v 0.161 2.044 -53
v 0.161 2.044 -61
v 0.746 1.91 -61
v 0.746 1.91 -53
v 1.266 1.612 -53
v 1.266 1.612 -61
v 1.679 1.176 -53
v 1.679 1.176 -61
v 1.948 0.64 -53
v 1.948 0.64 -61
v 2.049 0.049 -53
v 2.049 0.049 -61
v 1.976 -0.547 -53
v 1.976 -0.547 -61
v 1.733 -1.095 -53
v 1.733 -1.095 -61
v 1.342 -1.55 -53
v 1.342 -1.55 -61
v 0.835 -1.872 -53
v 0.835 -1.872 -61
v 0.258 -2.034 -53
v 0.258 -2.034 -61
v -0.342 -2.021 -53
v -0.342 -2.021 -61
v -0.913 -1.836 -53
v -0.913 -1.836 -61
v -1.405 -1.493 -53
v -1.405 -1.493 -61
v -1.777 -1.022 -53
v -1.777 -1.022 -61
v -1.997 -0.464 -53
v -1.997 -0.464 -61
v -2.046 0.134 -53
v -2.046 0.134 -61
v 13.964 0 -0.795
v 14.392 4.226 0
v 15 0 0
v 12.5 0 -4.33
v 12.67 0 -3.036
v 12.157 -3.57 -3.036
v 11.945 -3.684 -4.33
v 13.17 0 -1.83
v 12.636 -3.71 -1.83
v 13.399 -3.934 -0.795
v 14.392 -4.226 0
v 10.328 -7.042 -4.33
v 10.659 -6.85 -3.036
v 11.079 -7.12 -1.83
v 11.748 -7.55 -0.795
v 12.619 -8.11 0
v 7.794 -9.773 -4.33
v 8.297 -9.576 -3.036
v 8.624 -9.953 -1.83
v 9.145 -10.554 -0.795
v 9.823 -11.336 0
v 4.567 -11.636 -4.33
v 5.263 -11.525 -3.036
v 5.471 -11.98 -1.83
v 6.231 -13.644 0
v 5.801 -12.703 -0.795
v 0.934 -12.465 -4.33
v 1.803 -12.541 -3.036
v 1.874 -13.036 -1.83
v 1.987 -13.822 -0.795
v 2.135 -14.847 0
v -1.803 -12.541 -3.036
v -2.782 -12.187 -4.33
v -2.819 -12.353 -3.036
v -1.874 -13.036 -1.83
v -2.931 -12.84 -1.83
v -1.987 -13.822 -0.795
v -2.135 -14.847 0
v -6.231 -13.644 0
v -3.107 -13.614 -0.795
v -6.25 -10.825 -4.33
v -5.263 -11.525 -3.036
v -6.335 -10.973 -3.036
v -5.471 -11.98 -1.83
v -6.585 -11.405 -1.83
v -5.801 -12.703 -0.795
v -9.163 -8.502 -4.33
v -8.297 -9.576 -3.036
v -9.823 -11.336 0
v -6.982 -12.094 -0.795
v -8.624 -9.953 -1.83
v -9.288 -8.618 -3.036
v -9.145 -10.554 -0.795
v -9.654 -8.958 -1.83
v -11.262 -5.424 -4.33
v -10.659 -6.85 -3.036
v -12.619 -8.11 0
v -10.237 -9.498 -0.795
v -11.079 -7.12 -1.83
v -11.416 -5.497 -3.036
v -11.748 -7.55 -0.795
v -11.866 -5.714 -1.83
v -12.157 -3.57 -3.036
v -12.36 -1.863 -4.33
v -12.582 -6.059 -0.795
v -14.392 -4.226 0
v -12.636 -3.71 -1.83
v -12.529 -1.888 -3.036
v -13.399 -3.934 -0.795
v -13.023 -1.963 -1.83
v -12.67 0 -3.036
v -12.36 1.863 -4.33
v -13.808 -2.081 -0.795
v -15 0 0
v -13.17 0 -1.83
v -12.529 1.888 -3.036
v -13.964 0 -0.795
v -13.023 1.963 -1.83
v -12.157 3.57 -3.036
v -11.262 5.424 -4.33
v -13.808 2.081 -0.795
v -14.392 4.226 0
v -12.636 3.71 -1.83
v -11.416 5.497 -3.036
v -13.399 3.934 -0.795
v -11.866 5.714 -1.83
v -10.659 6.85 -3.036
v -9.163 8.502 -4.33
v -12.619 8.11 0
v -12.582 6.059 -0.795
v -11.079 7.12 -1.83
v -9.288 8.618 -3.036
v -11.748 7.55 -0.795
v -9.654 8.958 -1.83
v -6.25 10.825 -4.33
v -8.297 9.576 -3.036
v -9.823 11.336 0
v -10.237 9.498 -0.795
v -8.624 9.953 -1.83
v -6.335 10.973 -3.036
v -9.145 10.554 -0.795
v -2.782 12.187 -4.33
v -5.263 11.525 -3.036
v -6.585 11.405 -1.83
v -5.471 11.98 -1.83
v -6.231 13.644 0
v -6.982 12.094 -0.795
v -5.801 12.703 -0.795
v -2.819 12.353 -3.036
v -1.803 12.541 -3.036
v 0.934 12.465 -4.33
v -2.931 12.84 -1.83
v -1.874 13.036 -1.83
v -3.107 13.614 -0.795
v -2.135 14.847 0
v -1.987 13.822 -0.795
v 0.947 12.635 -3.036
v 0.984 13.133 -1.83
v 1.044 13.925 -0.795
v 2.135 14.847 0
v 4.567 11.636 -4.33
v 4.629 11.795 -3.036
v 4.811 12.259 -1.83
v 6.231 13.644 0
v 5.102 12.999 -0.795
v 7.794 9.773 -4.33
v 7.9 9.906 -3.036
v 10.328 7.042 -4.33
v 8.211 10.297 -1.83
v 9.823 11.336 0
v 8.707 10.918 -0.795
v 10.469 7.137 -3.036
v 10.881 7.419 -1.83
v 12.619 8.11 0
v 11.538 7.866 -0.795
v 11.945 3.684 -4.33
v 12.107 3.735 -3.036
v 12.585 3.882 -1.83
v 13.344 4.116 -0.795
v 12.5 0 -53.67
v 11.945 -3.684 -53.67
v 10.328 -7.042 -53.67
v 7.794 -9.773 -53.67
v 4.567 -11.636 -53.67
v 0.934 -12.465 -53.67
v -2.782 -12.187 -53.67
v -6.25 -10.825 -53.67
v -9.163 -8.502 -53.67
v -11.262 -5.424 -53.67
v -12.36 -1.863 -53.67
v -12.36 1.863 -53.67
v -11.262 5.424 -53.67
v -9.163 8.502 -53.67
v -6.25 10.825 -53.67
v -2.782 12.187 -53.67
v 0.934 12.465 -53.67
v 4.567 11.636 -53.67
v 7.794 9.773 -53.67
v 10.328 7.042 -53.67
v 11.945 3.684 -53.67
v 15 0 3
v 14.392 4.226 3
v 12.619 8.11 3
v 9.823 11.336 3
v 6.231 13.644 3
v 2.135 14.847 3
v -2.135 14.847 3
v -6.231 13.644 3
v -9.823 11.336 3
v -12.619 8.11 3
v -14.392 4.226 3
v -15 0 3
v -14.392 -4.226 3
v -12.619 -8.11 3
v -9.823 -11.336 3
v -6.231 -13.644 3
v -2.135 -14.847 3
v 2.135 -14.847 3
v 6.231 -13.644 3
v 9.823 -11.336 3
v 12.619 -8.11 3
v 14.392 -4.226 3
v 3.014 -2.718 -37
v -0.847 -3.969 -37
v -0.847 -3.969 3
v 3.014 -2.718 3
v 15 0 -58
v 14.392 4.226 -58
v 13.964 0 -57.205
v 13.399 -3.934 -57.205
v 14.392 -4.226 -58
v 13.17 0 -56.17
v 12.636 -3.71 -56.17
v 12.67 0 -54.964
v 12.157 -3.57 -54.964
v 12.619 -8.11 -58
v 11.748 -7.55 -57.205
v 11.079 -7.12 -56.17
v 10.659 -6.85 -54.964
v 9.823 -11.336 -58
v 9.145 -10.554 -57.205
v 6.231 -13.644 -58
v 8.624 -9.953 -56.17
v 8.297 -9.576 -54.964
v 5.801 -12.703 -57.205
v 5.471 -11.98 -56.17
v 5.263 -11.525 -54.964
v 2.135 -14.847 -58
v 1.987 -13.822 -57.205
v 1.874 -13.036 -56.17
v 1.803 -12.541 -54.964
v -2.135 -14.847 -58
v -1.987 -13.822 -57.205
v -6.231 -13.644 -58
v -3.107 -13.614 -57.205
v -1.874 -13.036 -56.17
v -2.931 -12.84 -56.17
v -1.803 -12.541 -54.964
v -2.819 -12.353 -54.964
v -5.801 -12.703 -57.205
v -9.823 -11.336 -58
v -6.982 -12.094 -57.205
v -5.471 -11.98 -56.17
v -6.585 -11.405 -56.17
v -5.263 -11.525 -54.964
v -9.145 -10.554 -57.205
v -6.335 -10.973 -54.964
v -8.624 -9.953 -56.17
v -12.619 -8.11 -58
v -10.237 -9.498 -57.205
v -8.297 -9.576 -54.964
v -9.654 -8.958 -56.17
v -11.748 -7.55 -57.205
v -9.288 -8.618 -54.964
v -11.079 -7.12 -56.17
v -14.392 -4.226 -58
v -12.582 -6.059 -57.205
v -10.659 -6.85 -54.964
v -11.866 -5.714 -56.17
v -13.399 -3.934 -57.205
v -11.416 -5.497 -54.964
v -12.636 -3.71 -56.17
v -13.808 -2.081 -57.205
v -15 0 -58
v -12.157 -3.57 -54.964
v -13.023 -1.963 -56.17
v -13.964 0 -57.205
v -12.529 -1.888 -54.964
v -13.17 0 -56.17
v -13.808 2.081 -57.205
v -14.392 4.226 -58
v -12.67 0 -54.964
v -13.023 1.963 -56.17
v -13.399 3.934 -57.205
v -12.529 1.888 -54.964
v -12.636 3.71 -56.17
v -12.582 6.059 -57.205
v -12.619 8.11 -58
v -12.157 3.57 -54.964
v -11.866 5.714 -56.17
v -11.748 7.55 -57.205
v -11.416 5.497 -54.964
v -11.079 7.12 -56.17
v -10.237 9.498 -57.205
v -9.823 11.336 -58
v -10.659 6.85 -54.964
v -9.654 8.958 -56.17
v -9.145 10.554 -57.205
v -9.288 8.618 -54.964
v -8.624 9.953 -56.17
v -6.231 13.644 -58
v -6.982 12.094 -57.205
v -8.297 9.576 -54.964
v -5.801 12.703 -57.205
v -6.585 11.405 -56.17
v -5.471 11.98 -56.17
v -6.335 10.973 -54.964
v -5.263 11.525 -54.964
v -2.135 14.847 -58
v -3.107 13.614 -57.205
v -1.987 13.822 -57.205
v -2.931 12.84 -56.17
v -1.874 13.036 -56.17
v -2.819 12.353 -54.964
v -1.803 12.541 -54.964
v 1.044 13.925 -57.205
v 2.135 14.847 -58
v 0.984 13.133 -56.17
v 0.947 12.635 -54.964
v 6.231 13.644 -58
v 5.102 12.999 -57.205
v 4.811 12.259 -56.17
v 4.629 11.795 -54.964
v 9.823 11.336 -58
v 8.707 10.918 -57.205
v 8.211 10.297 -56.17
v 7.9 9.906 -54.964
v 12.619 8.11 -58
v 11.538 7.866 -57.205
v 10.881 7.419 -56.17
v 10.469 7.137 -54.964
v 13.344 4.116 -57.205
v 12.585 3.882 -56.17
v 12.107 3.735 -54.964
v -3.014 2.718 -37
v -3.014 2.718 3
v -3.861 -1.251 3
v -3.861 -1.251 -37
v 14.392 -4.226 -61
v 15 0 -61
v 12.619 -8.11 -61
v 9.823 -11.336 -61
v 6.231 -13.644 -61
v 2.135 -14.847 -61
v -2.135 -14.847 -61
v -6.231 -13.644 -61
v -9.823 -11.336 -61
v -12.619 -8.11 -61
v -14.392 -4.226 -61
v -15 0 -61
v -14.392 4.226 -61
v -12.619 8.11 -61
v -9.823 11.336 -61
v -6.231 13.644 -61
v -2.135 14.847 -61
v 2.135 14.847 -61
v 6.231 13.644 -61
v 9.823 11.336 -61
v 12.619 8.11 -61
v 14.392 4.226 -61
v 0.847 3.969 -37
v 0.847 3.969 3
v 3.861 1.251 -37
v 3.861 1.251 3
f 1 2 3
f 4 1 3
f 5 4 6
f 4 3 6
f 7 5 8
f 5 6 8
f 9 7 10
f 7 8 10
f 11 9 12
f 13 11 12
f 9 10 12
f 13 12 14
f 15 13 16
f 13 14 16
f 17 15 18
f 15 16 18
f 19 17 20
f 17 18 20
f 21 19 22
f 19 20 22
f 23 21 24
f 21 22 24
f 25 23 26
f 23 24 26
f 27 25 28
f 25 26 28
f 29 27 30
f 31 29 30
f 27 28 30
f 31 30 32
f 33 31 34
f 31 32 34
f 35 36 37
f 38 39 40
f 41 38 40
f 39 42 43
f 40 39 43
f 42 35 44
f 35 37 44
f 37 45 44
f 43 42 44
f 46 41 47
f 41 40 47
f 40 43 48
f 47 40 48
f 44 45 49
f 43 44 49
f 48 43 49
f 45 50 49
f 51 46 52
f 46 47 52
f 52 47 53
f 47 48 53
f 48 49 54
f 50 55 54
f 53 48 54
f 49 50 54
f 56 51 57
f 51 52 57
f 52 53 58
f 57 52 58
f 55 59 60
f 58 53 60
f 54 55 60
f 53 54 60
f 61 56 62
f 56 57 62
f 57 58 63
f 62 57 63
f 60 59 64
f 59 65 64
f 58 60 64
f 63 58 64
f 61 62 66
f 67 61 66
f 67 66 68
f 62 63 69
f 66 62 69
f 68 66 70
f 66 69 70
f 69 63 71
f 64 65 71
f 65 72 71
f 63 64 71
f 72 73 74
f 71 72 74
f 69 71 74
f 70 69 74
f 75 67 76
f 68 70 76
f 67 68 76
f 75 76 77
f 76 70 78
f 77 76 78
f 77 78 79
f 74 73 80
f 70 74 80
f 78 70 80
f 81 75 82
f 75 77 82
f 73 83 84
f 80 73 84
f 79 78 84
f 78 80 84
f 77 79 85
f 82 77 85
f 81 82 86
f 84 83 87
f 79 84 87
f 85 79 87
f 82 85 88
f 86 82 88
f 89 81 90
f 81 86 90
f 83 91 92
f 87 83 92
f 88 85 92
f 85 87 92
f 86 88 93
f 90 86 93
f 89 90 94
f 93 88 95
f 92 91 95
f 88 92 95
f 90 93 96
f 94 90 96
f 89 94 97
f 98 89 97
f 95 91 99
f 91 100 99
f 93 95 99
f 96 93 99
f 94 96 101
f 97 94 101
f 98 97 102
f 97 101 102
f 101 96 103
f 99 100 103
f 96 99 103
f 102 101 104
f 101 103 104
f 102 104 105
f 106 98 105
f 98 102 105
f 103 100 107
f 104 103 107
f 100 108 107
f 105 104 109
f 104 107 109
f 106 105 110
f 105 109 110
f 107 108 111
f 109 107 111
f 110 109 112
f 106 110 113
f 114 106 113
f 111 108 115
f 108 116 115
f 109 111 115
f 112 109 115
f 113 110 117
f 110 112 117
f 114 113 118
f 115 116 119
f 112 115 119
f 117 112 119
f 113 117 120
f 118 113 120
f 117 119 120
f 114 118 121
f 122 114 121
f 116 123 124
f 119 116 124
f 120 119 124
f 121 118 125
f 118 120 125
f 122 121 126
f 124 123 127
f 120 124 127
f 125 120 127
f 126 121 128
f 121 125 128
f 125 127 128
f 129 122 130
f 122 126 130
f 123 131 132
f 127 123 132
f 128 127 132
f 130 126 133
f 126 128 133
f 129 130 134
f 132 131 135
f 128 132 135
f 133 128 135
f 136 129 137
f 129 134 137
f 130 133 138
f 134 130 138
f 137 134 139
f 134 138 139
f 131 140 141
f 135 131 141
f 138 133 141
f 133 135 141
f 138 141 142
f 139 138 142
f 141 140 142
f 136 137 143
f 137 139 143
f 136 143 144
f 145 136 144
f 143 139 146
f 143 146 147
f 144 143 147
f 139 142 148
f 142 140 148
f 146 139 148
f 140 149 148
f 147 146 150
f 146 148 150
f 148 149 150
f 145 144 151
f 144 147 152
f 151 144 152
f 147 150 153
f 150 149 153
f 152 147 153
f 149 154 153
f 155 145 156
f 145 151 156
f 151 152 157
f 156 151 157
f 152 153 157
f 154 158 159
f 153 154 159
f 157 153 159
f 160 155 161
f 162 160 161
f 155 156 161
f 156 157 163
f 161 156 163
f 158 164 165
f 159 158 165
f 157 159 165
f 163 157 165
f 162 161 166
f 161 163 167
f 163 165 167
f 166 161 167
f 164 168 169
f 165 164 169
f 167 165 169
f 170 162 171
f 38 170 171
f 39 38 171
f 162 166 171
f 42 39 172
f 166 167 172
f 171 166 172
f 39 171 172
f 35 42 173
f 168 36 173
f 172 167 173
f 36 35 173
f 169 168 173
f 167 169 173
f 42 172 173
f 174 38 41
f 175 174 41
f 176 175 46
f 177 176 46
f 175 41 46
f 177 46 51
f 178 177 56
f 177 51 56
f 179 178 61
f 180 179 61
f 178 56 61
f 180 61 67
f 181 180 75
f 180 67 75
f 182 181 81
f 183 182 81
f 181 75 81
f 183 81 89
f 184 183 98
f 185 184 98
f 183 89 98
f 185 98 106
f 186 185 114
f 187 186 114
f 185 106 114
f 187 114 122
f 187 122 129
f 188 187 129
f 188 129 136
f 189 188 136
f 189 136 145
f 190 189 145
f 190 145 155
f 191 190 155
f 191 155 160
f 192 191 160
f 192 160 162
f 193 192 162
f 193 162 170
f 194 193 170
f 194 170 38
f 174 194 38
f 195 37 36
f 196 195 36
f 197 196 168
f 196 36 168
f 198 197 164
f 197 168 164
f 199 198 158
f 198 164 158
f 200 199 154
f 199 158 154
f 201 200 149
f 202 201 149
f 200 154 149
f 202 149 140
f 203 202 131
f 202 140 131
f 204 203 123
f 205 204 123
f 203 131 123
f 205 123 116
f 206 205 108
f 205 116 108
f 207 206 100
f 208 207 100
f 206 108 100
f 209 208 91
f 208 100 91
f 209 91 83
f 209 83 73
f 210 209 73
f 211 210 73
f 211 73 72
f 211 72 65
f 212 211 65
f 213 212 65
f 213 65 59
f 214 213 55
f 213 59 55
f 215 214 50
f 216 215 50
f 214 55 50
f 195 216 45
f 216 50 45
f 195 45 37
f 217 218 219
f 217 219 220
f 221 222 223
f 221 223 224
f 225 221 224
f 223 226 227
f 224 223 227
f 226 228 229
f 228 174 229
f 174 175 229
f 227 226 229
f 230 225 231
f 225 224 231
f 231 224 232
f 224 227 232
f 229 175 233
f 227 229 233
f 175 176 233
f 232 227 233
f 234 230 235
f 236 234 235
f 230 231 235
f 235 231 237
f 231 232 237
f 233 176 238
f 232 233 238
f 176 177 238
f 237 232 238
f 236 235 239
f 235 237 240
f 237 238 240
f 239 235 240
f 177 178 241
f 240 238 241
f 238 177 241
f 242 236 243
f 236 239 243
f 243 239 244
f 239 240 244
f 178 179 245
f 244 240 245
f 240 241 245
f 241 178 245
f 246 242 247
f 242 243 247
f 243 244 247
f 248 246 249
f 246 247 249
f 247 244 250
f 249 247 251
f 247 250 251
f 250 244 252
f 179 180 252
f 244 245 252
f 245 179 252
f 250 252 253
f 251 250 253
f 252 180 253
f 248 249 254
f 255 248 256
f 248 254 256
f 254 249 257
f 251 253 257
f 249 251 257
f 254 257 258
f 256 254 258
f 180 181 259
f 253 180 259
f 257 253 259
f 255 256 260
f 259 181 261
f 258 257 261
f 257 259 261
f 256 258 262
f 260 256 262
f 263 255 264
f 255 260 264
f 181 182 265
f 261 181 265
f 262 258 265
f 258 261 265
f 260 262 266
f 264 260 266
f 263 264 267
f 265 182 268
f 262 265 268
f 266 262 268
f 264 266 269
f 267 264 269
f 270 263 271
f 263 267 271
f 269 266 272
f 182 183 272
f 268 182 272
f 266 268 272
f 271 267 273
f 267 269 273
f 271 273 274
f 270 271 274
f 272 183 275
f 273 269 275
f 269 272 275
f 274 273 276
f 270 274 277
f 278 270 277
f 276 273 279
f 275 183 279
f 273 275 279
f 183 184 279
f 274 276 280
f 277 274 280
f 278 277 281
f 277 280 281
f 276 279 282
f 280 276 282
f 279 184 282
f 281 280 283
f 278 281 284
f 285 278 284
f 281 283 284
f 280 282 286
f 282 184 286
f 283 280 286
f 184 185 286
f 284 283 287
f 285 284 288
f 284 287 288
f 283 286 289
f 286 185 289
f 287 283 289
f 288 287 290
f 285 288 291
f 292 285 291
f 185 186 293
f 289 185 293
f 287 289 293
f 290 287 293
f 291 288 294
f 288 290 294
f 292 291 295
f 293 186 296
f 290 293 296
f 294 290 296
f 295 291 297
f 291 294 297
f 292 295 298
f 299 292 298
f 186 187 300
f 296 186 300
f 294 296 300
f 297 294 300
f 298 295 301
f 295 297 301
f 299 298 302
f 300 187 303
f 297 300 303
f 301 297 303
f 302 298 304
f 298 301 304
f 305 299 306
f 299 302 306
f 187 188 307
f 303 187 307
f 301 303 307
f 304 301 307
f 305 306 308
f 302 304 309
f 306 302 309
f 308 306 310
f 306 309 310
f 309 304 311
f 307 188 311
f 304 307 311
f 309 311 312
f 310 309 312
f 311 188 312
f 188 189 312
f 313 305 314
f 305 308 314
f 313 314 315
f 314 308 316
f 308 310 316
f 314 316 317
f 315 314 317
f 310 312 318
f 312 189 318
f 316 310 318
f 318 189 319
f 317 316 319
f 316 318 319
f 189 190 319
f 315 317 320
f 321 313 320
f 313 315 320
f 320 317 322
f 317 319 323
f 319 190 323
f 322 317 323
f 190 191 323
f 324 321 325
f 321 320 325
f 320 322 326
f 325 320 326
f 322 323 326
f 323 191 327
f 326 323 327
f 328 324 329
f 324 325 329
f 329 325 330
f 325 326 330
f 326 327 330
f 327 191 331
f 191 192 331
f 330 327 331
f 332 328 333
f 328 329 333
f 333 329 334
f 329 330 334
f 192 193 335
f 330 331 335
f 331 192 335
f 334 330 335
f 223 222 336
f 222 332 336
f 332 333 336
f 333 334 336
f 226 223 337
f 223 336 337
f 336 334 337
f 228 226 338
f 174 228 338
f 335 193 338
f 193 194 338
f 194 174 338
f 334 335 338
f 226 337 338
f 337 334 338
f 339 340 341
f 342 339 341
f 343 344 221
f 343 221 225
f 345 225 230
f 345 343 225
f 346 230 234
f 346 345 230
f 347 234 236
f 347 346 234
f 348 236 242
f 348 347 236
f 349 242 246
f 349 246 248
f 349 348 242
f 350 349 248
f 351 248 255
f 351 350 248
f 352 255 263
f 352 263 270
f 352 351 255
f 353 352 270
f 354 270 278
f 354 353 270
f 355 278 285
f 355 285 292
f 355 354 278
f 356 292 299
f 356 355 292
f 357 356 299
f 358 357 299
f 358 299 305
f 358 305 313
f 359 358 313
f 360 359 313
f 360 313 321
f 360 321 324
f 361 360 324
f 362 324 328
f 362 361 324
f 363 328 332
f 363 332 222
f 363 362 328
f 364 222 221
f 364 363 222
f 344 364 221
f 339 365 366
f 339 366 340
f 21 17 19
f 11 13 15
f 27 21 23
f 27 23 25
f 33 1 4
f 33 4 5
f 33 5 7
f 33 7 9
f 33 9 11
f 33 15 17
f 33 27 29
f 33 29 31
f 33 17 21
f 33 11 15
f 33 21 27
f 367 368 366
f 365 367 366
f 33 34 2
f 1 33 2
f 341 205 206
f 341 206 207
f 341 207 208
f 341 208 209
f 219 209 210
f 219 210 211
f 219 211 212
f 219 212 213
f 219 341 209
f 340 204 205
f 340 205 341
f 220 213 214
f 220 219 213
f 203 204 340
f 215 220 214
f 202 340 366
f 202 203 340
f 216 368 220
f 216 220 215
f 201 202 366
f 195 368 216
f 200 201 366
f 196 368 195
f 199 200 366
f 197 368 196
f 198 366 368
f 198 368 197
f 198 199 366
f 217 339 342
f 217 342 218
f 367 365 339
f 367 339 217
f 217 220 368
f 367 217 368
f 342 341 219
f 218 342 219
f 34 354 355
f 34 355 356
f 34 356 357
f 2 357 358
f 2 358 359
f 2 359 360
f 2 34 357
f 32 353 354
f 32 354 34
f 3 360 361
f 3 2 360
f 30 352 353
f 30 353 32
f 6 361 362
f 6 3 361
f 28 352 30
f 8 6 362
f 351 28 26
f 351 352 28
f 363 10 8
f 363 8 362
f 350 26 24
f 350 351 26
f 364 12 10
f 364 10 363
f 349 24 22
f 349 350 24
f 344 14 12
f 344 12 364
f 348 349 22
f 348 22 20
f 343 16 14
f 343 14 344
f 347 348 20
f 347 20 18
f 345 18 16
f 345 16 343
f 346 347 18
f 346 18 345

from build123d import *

# Parameters (mm, degrees)
CROQUIS1_R              = 15
SALIENTE_EXTRUIR1_DEPTH = 3
CROQUIS3_R              = 9
SALIENTE_EXTRUIR3_DEPTH = 58
SALIENTE_EXTRUIR4_START = 3
CROQUIS4_R              = 15
SALIENTE_EXTRUIR4_DEPTH = 3
CORTAR_EXTRUIR1_DEPTH   = 8
CROQUIS8_R              = 12.5
CROQUIS8_R_2            = 9
SALIENTE_EXTRUIR7_DEPTH = 58
REDONDEO3_R             = 5
CORTAR_EXTRUIR2_DEPTH   = 40


with BuildPart() as part:
    # Croquis1 → Saliente-Extruir1 (new body)
    with BuildSketch(Plane.XY):
        Circle(CROQUIS1_R)
    extrude(amount=SALIENTE_EXTRUIR1_DEPTH)

    # Croquis3 → Saliente-Extruir3 (add)
    with BuildSketch(Plane(origin=(0, 0, 0), x_dir=(-1, 0, 0), z_dir=(0, 0, -1))):
        with Locations(Location((0, 0, 0), (0, 0, 180))):
            Circle(CROQUIS3_R)
    extrude(amount=SALIENTE_EXTRUIR3_DEPTH)

    # Croquis4 → Saliente-Extruir4 (add)
    with BuildSketch(Plane(origin=(0, 0, -58), x_dir=(-1, 0, 0), z_dir=(0, 0, -1)).offset(SALIENTE_EXTRUIR4_START)):
        with Locations(Location((0, 0, 0), (0, 0, 180))):
            Circle(CROQUIS4_R)
    extrude(amount=-SALIENTE_EXTRUIR4_DEPTH)

    # Croquis5 → Cortar-Extruir1 (cut)
    with BuildSketch(Plane(origin=(0, 0, -61), x_dir=(-1, 0, 0), z_dir=(0, 0, -1))):
        with BuildLine():
            Line((2.045621727, 0.133909486), (-0.160815889, 2.043682522))
            ThreePointArc((-0.160815889, 2.043682522), (-1.341615267, -1.550022089), (2.045621727, 0.133909486))
        make_face()
    extrude(amount=-CORTAR_EXTRUIR1_DEPTH, mode=Mode.SUBTRACT)

    # Croquis8 → Saliente-Extruir7 (add)
    with BuildSketch(Plane(origin=(0, 0, 0), x_dir=(-1, 0, 0), z_dir=(0, 0, -1))):
        with Locations(Location((0, 0, 0), (0, 0, 180))):
            Circle(CROQUIS8_R)
        Circle(CROQUIS8_R_2, mode=Mode.SUBTRACT)
    extrude(amount=SALIENTE_EXTRUIR7_DEPTH)

    # Redondeo3
    # the kernel refuses this fillet: 5 mm, written as the material it adds along each edge
    with BuildSketch(Plane(origin=(0, 0, -58), x_dir=(1, 0, 0), z_dir=(0, 1, 0))) as redondeo3_piece_1:
        with BuildLine():
            CenterArc((17.5, -4.330127019), REDONDEO3_R, 120, 60)
            Line((12.5, -4.330127019), (12.4, -4.330127019))
            Line((12.4, -4.330127019), (12.4, 0))
            Line((12.4, 0), (12.5, 0.1))
            ThreePointArc((12.5, 0.1), (13.75, 0.1), (14.95, 0.08660254))
            Line((14.95, 0.08660254), (15, 0))
        make_face()
    revolve(axis=Axis((0, 0, -58), (0, 0, -1)))
    with BuildSketch(Plane(origin=(0, 0, 0), x_dir=(1, 0, 0), z_dir=(0, 1, 0))) as redondeo3_piece_2:
        with BuildLine():
            CenterArc((17.5, 4.330127019), REDONDEO3_R, 180, 60)
            Line((15, 0), (14.95, -0.08660254))
            ThreePointArc((14.95, -0.08660254), (13.75, -0.1), (12.5, -0.1))
            Line((12.5, -0.1), (12.4, 0))
            Line((12.4, 0), (12.4, 4.330127019))
            Line((12.4, 4.330127019), (12.5, 4.330127019))
        make_face()
    revolve(axis=Axis((0, 0, 0), (0, 0, -1)))

    # Croquis2 → Cortar-Extruir2 (cut)
    with BuildSketch(Plane.XY.offset(3)):
        Polygon((3.013979252, -2.718374956), (3.861171395, 1.250995121), (0.847192143, 3.969370077), (-3.013979252, 2.718374956), (-3.861171395, -1.250995121), (-0.847192143, -3.969370077), align=None)
    extrude(amount=-CORTAR_EXTRUIR2_DEPTH, mode=Mode.SUBTRACT)


solid = part.part
